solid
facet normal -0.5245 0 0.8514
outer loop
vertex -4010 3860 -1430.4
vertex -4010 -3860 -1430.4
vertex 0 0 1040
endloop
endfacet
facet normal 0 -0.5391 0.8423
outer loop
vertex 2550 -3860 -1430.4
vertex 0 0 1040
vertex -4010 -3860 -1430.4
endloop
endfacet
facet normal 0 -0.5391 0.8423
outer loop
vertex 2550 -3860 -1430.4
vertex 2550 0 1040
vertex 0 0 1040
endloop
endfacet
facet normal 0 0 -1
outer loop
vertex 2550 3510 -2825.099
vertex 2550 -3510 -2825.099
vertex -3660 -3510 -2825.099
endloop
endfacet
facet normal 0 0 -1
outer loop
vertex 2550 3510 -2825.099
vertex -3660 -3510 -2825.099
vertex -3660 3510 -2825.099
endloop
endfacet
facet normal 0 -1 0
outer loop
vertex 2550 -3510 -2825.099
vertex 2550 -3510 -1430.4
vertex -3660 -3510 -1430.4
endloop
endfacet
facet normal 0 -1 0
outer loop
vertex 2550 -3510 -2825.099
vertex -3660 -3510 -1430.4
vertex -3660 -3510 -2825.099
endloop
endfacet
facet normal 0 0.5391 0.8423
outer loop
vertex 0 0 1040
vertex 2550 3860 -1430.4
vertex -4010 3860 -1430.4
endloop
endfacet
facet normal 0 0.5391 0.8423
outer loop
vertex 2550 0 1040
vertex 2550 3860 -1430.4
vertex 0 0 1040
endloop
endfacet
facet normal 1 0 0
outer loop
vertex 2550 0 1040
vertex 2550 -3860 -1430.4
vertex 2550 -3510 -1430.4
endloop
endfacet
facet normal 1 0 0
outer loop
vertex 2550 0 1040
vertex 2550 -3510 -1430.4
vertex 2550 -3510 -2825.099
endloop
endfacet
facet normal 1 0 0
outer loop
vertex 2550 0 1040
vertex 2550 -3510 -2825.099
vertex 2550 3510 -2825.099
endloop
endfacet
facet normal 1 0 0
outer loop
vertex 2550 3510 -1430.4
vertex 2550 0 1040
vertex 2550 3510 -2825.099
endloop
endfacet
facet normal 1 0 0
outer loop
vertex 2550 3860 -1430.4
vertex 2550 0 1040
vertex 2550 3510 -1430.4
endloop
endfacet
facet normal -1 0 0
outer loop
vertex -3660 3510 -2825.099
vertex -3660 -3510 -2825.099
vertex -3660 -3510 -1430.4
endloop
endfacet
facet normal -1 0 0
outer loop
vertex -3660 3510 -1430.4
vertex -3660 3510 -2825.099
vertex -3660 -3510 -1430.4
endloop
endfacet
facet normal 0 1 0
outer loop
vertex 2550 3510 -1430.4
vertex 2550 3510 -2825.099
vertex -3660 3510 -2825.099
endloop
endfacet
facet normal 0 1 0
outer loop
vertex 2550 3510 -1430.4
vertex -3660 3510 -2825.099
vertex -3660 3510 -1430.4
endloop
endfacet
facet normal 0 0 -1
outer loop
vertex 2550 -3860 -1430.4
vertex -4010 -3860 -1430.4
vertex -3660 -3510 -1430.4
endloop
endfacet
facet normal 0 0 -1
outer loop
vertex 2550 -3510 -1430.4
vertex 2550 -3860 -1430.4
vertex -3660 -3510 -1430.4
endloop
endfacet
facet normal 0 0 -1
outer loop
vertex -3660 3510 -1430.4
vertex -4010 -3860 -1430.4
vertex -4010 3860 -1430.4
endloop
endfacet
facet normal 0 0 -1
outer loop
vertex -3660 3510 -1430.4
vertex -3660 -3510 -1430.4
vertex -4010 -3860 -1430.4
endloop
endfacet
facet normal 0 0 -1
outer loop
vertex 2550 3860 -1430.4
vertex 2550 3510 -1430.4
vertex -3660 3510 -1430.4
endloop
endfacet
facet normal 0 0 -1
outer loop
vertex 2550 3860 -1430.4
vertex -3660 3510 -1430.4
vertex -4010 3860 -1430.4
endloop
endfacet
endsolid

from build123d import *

# Parameters (mm, degrees)
F1_DEPTH      = 2550
F1_DEPTH_BACK = 4870
F3_DEPTH      = 7370.001
F3_DEPTH_BACK = 350.001


with BuildPart() as f1:
    # F0 (on Right) → F1 (new body, two sides)
    with BuildSketch(Plane.YZ) as f1_sk:
        Polygon((0, 1040), (-1625, 0), (-3860, -1430.4), (-3510, -1430.4), (-3510, -2825.0989178658), (-1497.2229003906, -2825.0989178658), (-860, -2825.0989178658), (2955, -2825.0989178658), (3030, -2825.0989178658), (3510, -2825.0989178658), (3510, -1430.4), (3860, -1430.4), (1625, 0), align=None)
    extrude(amount=F1_DEPTH)
    extrude(f1_sk.sketch, amount=-F1_DEPTH_BACK)

    # F2 (on face) → F3 (cut, two sides)
    with BuildSketch(Plane.XZ.offset(3510)) as f3_sk:
        Polygon((0, -2825.0989178658), (-3660, -2825.0989178658), (-4870, -2825.0989178658), (-4870, -1430.4), (-4010, -1430.4), (0, 1040), (0, 1641.8843269348), (-5604.5145988464, 1641.8843269348), (-5604.5145988464, -4045.9384918213), (0, -4045.9384918213), align=None)
        Polygon((-3660, -2825.0989178658), (-3660, -1430.4), (-4010, -1430.4), (-4870, -1430.4), (-4870, -2825.0989178658), align=None)
    extrude(amount=-F3_DEPTH, mode=Mode.SUBTRACT)
    extrude(f3_sk.sketch, amount=F3_DEPTH_BACK, mode=Mode.SUBTRACT)


solid = f1.part
